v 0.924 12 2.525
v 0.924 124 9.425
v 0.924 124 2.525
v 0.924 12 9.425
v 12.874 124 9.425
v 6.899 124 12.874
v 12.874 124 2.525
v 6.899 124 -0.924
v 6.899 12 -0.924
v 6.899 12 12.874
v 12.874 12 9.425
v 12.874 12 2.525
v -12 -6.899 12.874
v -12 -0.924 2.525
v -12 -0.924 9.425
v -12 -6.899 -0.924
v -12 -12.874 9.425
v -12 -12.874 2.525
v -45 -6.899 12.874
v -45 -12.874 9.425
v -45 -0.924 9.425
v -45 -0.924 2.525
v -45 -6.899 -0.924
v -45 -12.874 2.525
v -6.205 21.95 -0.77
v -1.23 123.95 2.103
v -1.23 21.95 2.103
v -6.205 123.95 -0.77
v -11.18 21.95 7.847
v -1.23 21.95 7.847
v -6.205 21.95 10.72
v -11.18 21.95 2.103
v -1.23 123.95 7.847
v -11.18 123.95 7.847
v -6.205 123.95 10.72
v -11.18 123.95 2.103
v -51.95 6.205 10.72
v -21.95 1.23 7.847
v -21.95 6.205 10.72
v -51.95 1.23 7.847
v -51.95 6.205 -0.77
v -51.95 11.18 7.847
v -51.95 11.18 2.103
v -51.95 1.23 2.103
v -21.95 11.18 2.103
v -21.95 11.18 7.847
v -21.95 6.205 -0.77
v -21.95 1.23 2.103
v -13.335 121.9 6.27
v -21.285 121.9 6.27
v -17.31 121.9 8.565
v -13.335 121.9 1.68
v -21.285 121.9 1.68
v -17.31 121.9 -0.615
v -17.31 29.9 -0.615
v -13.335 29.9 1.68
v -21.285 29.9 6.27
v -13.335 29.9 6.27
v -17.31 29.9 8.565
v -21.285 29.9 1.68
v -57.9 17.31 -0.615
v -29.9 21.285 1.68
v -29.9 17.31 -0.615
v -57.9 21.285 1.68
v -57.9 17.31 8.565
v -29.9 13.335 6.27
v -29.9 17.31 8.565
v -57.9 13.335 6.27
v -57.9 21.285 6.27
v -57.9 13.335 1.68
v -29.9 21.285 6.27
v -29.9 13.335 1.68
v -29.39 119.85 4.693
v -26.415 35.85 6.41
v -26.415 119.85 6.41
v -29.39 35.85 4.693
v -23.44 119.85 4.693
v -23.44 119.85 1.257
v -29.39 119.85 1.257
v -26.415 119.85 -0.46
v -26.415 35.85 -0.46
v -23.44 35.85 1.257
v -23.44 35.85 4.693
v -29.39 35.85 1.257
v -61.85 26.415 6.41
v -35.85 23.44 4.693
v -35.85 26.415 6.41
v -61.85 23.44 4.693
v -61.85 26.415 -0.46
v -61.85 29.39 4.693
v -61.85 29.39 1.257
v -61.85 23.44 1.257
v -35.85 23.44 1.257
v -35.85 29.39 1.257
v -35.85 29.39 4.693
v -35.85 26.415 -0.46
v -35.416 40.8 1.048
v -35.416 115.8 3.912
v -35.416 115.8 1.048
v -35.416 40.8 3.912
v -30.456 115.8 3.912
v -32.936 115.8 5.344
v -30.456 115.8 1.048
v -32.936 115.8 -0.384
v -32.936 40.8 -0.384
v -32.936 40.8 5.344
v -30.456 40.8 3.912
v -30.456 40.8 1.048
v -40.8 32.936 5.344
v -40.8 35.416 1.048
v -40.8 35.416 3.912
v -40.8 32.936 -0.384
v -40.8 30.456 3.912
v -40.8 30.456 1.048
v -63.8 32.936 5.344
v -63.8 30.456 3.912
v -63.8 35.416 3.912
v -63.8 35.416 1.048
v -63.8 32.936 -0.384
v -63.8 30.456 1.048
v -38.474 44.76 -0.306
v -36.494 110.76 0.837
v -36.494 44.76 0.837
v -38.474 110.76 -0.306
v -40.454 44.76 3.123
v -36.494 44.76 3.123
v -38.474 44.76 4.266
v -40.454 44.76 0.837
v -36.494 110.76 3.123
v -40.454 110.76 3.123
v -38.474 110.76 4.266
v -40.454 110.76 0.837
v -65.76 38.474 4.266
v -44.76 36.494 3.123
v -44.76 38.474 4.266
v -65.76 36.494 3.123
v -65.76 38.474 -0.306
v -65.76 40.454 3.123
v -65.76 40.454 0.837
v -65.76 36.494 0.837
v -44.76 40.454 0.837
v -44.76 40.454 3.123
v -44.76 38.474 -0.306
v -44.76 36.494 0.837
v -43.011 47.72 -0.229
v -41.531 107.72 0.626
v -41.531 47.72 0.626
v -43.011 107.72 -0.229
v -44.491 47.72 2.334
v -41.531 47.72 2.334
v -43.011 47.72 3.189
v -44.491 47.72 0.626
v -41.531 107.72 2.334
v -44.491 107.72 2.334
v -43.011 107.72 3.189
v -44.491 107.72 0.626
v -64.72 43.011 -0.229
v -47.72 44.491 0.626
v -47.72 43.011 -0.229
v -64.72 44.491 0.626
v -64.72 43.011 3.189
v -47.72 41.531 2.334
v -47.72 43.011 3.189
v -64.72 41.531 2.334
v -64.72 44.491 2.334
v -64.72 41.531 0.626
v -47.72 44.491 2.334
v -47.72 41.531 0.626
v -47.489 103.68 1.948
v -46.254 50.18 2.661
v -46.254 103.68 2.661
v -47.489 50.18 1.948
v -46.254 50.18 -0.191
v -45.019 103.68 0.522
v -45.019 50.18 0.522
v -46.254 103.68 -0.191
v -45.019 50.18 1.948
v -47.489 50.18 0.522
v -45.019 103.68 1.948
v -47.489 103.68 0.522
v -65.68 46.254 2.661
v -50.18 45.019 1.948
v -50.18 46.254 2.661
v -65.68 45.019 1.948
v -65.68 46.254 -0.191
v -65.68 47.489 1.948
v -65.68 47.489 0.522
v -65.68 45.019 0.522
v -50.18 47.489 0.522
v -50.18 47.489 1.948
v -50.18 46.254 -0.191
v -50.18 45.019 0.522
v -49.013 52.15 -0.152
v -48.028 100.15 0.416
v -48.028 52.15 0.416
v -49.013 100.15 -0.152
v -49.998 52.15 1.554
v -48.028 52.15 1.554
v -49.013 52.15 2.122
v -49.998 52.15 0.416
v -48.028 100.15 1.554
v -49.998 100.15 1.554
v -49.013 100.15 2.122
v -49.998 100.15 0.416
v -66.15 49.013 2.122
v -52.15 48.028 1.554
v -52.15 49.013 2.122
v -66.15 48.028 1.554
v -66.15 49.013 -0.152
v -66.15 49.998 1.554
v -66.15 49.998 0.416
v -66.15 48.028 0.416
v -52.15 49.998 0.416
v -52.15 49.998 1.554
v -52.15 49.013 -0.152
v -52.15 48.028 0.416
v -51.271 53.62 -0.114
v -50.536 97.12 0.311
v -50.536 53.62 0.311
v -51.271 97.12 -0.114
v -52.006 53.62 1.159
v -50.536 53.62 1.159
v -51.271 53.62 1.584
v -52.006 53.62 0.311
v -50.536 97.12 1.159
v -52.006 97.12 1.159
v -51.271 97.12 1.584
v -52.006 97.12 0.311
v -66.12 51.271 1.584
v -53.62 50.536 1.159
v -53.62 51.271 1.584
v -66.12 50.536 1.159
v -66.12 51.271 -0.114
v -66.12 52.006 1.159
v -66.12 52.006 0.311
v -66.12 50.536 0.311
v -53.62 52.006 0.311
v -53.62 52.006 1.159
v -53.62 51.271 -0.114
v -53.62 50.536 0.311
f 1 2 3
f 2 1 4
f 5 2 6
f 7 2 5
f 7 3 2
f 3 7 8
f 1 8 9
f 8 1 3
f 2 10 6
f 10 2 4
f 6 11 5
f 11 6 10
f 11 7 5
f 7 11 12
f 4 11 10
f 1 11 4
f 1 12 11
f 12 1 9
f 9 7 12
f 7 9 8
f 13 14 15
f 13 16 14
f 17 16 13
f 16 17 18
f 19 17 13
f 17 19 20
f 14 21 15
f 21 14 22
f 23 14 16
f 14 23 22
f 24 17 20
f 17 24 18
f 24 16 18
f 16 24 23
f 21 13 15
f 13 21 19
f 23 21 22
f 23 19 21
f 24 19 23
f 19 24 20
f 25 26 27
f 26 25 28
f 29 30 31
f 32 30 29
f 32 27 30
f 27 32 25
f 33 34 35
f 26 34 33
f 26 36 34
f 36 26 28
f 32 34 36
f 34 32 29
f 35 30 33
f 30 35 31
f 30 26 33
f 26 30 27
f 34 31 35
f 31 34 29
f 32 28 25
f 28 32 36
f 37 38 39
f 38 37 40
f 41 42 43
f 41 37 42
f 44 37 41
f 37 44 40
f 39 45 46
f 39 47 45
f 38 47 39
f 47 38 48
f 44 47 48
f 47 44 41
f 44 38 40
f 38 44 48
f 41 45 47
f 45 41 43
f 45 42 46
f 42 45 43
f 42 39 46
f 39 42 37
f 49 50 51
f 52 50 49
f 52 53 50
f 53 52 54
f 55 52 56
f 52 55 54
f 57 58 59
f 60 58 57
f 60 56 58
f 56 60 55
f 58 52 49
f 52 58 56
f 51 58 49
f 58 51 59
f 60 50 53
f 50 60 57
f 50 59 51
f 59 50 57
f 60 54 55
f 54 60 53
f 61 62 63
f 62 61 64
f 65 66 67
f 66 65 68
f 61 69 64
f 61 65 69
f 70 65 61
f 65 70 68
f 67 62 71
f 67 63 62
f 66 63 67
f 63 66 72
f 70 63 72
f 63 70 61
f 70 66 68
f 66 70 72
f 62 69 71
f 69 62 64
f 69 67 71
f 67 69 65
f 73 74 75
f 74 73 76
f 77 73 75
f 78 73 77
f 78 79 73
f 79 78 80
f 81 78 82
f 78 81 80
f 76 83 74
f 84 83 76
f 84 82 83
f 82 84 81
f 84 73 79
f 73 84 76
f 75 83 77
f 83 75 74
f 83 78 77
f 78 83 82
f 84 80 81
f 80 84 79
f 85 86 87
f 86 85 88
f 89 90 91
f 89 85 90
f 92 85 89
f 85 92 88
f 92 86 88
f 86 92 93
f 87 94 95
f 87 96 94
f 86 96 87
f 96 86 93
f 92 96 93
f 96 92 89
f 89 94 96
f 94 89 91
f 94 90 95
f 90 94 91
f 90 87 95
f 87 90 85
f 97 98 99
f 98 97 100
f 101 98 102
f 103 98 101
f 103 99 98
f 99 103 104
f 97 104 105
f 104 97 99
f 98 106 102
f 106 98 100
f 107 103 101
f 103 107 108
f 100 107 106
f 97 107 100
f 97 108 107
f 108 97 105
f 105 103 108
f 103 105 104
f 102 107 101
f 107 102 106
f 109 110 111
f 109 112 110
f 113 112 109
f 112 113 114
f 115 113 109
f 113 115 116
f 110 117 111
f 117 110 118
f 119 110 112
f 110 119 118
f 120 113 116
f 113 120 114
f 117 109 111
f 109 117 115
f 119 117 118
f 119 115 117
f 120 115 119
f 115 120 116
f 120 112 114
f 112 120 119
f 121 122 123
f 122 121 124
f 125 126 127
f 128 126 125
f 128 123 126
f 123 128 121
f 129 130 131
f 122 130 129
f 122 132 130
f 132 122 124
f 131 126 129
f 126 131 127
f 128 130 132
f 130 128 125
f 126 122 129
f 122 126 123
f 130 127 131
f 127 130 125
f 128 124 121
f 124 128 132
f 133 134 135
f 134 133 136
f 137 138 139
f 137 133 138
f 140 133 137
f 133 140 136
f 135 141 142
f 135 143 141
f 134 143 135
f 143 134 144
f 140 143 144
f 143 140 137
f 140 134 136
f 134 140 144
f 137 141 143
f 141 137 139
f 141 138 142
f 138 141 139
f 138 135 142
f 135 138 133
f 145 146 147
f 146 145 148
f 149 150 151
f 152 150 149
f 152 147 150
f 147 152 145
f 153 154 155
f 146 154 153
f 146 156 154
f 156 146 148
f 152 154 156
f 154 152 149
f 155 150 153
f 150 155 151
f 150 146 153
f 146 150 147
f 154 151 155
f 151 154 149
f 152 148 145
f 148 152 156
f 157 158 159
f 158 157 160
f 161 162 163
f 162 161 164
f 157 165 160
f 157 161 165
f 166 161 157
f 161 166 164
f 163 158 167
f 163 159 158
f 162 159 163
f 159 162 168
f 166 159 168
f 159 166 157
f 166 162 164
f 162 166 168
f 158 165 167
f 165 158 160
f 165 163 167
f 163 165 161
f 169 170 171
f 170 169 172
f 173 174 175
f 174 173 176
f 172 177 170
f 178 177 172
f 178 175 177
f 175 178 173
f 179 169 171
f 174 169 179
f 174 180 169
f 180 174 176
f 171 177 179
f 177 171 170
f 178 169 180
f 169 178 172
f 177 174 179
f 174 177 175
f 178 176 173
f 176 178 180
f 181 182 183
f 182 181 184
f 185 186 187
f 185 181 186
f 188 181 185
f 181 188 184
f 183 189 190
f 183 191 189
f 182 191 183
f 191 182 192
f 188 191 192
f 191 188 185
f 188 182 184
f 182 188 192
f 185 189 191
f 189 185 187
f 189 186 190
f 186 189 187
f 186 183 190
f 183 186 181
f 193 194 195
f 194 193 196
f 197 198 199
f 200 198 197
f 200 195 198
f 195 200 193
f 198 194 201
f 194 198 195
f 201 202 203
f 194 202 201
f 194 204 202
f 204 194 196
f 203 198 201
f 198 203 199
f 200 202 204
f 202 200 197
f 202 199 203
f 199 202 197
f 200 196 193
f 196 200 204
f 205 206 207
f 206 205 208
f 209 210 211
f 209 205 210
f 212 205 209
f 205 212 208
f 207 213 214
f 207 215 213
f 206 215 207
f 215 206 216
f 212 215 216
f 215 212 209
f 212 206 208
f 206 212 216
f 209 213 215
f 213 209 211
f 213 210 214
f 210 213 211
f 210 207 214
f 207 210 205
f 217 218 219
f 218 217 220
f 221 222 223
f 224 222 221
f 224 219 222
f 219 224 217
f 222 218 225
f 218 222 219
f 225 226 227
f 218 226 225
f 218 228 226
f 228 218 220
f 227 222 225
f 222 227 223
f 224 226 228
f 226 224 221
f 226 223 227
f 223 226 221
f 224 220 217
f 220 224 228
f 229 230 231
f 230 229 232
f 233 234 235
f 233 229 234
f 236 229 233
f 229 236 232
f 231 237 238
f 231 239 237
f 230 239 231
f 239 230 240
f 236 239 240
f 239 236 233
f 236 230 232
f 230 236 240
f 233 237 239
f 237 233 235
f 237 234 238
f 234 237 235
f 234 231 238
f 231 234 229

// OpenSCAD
// wrench sizes from https://www1.mscdirect.com/PDF/FASTENERS/HexKeys.pdf
// width, length_long_side, length_short_side, bend_radius
wrenches = [
    //[34, 300, 100, 34], // 34mm
    [11.95, 124, 45, 12], // 12mm
    [9.95, 112, 40, 10], // 10mm
    [7.95, 100, 36, 8],  // 8mm
    [5.95, 90, 32, 6],  // 6mm
    [4.96, 80, 28, 5],  // 5mm
    [3.96, 70, 25, 4],  // 4mm
    [2.96, 63, 20, 3],  // 3mm
    [2.47, 56, 18, 2.5],  // 2.5mm
    [1.97, 50, 16, 2],  // 2mm
    [1.47, 45, 14, 1.5],  // 1.5mm
];


module hexagon(d) {
    // d is the distance between parallel edges of the hexagon
    // x, where x is the short side of a 30/60/90 degree triangle
    x = d / (2*sqrt(3));
    polygon([
        [-1 * x, x * sqrt(3)], [x, x * sqrt(3)],
        [2 * x, 0],
        [x, -1 * x * sqrt(3)], [-1 * x, -x * sqrt(3)],
        [-2 * x, 0]
    ]);
}

module hex_key(wrench_diameter, wrench_long_side, wrench_short_side, wrench_bend_radius) {
    union() {
        translate([wrench_diameter / sqrt(3), wrench_bend_radius, 0]) {
            rotate([-90, 90, 0]) {
                linear_extrude(wrench_long_side-wrench_bend_radius) {
                    hexagon(wrench_diameter);
                }
            }
        }

        translate([-wrench_bend_radius, -wrench_diameter / sqrt(3), 0]) {
            rotate([0, 0, 0]) {
                rotate([0, -90, 0]) {
                    linear_extrude(wrench_short_side-wrench_bend_radius) {
                        hexagon(wrench_diameter);
                    }
                }
            }
        }
        
        translate([-wrench_bend_radius, wrench_bend_radius, 0]) {
            difference() {
                rotate_extrude(angle = 90) {
                    rotate([0, 0, -90]) {
                        translate([0, wrench_bend_radius + wrench_diameter / sqrt(3), 0]) {
                            rotate([0, 0, 0]) {
                                hexagon(wrench_diameter);
                            }
                        }
                    }
                }
                rotate([0, 0, 90]) {
                    translate([-50 * wrench_diameter, 0, -50 * wrench_diameter]) {
                        cube(100*wrench_diameter);
                    }
                }
                translate([-50 * wrench_diameter, 0, -50 * wrench_diameter]) {
                    cube(100*wrench_diameter);
                }
            }
        }
    }
}

function sum_width(wrenches, cur_position, final_position)
    = cur_position > final_position ? 0 : wrenches[cur_position][0] + sum_width(wrenches, cur_position+1, final_position);

for (i=[0:len(wrenches)-1]) {
    offset = sum_width(wrenches, 0, i-1);
    
    wrench = wrenches[i];
    translate([-offset, offset, wrench[0]/2]) {
        hex_key(wrench[0], wrench[1], wrench[2], wrench[3]);
    }
}
